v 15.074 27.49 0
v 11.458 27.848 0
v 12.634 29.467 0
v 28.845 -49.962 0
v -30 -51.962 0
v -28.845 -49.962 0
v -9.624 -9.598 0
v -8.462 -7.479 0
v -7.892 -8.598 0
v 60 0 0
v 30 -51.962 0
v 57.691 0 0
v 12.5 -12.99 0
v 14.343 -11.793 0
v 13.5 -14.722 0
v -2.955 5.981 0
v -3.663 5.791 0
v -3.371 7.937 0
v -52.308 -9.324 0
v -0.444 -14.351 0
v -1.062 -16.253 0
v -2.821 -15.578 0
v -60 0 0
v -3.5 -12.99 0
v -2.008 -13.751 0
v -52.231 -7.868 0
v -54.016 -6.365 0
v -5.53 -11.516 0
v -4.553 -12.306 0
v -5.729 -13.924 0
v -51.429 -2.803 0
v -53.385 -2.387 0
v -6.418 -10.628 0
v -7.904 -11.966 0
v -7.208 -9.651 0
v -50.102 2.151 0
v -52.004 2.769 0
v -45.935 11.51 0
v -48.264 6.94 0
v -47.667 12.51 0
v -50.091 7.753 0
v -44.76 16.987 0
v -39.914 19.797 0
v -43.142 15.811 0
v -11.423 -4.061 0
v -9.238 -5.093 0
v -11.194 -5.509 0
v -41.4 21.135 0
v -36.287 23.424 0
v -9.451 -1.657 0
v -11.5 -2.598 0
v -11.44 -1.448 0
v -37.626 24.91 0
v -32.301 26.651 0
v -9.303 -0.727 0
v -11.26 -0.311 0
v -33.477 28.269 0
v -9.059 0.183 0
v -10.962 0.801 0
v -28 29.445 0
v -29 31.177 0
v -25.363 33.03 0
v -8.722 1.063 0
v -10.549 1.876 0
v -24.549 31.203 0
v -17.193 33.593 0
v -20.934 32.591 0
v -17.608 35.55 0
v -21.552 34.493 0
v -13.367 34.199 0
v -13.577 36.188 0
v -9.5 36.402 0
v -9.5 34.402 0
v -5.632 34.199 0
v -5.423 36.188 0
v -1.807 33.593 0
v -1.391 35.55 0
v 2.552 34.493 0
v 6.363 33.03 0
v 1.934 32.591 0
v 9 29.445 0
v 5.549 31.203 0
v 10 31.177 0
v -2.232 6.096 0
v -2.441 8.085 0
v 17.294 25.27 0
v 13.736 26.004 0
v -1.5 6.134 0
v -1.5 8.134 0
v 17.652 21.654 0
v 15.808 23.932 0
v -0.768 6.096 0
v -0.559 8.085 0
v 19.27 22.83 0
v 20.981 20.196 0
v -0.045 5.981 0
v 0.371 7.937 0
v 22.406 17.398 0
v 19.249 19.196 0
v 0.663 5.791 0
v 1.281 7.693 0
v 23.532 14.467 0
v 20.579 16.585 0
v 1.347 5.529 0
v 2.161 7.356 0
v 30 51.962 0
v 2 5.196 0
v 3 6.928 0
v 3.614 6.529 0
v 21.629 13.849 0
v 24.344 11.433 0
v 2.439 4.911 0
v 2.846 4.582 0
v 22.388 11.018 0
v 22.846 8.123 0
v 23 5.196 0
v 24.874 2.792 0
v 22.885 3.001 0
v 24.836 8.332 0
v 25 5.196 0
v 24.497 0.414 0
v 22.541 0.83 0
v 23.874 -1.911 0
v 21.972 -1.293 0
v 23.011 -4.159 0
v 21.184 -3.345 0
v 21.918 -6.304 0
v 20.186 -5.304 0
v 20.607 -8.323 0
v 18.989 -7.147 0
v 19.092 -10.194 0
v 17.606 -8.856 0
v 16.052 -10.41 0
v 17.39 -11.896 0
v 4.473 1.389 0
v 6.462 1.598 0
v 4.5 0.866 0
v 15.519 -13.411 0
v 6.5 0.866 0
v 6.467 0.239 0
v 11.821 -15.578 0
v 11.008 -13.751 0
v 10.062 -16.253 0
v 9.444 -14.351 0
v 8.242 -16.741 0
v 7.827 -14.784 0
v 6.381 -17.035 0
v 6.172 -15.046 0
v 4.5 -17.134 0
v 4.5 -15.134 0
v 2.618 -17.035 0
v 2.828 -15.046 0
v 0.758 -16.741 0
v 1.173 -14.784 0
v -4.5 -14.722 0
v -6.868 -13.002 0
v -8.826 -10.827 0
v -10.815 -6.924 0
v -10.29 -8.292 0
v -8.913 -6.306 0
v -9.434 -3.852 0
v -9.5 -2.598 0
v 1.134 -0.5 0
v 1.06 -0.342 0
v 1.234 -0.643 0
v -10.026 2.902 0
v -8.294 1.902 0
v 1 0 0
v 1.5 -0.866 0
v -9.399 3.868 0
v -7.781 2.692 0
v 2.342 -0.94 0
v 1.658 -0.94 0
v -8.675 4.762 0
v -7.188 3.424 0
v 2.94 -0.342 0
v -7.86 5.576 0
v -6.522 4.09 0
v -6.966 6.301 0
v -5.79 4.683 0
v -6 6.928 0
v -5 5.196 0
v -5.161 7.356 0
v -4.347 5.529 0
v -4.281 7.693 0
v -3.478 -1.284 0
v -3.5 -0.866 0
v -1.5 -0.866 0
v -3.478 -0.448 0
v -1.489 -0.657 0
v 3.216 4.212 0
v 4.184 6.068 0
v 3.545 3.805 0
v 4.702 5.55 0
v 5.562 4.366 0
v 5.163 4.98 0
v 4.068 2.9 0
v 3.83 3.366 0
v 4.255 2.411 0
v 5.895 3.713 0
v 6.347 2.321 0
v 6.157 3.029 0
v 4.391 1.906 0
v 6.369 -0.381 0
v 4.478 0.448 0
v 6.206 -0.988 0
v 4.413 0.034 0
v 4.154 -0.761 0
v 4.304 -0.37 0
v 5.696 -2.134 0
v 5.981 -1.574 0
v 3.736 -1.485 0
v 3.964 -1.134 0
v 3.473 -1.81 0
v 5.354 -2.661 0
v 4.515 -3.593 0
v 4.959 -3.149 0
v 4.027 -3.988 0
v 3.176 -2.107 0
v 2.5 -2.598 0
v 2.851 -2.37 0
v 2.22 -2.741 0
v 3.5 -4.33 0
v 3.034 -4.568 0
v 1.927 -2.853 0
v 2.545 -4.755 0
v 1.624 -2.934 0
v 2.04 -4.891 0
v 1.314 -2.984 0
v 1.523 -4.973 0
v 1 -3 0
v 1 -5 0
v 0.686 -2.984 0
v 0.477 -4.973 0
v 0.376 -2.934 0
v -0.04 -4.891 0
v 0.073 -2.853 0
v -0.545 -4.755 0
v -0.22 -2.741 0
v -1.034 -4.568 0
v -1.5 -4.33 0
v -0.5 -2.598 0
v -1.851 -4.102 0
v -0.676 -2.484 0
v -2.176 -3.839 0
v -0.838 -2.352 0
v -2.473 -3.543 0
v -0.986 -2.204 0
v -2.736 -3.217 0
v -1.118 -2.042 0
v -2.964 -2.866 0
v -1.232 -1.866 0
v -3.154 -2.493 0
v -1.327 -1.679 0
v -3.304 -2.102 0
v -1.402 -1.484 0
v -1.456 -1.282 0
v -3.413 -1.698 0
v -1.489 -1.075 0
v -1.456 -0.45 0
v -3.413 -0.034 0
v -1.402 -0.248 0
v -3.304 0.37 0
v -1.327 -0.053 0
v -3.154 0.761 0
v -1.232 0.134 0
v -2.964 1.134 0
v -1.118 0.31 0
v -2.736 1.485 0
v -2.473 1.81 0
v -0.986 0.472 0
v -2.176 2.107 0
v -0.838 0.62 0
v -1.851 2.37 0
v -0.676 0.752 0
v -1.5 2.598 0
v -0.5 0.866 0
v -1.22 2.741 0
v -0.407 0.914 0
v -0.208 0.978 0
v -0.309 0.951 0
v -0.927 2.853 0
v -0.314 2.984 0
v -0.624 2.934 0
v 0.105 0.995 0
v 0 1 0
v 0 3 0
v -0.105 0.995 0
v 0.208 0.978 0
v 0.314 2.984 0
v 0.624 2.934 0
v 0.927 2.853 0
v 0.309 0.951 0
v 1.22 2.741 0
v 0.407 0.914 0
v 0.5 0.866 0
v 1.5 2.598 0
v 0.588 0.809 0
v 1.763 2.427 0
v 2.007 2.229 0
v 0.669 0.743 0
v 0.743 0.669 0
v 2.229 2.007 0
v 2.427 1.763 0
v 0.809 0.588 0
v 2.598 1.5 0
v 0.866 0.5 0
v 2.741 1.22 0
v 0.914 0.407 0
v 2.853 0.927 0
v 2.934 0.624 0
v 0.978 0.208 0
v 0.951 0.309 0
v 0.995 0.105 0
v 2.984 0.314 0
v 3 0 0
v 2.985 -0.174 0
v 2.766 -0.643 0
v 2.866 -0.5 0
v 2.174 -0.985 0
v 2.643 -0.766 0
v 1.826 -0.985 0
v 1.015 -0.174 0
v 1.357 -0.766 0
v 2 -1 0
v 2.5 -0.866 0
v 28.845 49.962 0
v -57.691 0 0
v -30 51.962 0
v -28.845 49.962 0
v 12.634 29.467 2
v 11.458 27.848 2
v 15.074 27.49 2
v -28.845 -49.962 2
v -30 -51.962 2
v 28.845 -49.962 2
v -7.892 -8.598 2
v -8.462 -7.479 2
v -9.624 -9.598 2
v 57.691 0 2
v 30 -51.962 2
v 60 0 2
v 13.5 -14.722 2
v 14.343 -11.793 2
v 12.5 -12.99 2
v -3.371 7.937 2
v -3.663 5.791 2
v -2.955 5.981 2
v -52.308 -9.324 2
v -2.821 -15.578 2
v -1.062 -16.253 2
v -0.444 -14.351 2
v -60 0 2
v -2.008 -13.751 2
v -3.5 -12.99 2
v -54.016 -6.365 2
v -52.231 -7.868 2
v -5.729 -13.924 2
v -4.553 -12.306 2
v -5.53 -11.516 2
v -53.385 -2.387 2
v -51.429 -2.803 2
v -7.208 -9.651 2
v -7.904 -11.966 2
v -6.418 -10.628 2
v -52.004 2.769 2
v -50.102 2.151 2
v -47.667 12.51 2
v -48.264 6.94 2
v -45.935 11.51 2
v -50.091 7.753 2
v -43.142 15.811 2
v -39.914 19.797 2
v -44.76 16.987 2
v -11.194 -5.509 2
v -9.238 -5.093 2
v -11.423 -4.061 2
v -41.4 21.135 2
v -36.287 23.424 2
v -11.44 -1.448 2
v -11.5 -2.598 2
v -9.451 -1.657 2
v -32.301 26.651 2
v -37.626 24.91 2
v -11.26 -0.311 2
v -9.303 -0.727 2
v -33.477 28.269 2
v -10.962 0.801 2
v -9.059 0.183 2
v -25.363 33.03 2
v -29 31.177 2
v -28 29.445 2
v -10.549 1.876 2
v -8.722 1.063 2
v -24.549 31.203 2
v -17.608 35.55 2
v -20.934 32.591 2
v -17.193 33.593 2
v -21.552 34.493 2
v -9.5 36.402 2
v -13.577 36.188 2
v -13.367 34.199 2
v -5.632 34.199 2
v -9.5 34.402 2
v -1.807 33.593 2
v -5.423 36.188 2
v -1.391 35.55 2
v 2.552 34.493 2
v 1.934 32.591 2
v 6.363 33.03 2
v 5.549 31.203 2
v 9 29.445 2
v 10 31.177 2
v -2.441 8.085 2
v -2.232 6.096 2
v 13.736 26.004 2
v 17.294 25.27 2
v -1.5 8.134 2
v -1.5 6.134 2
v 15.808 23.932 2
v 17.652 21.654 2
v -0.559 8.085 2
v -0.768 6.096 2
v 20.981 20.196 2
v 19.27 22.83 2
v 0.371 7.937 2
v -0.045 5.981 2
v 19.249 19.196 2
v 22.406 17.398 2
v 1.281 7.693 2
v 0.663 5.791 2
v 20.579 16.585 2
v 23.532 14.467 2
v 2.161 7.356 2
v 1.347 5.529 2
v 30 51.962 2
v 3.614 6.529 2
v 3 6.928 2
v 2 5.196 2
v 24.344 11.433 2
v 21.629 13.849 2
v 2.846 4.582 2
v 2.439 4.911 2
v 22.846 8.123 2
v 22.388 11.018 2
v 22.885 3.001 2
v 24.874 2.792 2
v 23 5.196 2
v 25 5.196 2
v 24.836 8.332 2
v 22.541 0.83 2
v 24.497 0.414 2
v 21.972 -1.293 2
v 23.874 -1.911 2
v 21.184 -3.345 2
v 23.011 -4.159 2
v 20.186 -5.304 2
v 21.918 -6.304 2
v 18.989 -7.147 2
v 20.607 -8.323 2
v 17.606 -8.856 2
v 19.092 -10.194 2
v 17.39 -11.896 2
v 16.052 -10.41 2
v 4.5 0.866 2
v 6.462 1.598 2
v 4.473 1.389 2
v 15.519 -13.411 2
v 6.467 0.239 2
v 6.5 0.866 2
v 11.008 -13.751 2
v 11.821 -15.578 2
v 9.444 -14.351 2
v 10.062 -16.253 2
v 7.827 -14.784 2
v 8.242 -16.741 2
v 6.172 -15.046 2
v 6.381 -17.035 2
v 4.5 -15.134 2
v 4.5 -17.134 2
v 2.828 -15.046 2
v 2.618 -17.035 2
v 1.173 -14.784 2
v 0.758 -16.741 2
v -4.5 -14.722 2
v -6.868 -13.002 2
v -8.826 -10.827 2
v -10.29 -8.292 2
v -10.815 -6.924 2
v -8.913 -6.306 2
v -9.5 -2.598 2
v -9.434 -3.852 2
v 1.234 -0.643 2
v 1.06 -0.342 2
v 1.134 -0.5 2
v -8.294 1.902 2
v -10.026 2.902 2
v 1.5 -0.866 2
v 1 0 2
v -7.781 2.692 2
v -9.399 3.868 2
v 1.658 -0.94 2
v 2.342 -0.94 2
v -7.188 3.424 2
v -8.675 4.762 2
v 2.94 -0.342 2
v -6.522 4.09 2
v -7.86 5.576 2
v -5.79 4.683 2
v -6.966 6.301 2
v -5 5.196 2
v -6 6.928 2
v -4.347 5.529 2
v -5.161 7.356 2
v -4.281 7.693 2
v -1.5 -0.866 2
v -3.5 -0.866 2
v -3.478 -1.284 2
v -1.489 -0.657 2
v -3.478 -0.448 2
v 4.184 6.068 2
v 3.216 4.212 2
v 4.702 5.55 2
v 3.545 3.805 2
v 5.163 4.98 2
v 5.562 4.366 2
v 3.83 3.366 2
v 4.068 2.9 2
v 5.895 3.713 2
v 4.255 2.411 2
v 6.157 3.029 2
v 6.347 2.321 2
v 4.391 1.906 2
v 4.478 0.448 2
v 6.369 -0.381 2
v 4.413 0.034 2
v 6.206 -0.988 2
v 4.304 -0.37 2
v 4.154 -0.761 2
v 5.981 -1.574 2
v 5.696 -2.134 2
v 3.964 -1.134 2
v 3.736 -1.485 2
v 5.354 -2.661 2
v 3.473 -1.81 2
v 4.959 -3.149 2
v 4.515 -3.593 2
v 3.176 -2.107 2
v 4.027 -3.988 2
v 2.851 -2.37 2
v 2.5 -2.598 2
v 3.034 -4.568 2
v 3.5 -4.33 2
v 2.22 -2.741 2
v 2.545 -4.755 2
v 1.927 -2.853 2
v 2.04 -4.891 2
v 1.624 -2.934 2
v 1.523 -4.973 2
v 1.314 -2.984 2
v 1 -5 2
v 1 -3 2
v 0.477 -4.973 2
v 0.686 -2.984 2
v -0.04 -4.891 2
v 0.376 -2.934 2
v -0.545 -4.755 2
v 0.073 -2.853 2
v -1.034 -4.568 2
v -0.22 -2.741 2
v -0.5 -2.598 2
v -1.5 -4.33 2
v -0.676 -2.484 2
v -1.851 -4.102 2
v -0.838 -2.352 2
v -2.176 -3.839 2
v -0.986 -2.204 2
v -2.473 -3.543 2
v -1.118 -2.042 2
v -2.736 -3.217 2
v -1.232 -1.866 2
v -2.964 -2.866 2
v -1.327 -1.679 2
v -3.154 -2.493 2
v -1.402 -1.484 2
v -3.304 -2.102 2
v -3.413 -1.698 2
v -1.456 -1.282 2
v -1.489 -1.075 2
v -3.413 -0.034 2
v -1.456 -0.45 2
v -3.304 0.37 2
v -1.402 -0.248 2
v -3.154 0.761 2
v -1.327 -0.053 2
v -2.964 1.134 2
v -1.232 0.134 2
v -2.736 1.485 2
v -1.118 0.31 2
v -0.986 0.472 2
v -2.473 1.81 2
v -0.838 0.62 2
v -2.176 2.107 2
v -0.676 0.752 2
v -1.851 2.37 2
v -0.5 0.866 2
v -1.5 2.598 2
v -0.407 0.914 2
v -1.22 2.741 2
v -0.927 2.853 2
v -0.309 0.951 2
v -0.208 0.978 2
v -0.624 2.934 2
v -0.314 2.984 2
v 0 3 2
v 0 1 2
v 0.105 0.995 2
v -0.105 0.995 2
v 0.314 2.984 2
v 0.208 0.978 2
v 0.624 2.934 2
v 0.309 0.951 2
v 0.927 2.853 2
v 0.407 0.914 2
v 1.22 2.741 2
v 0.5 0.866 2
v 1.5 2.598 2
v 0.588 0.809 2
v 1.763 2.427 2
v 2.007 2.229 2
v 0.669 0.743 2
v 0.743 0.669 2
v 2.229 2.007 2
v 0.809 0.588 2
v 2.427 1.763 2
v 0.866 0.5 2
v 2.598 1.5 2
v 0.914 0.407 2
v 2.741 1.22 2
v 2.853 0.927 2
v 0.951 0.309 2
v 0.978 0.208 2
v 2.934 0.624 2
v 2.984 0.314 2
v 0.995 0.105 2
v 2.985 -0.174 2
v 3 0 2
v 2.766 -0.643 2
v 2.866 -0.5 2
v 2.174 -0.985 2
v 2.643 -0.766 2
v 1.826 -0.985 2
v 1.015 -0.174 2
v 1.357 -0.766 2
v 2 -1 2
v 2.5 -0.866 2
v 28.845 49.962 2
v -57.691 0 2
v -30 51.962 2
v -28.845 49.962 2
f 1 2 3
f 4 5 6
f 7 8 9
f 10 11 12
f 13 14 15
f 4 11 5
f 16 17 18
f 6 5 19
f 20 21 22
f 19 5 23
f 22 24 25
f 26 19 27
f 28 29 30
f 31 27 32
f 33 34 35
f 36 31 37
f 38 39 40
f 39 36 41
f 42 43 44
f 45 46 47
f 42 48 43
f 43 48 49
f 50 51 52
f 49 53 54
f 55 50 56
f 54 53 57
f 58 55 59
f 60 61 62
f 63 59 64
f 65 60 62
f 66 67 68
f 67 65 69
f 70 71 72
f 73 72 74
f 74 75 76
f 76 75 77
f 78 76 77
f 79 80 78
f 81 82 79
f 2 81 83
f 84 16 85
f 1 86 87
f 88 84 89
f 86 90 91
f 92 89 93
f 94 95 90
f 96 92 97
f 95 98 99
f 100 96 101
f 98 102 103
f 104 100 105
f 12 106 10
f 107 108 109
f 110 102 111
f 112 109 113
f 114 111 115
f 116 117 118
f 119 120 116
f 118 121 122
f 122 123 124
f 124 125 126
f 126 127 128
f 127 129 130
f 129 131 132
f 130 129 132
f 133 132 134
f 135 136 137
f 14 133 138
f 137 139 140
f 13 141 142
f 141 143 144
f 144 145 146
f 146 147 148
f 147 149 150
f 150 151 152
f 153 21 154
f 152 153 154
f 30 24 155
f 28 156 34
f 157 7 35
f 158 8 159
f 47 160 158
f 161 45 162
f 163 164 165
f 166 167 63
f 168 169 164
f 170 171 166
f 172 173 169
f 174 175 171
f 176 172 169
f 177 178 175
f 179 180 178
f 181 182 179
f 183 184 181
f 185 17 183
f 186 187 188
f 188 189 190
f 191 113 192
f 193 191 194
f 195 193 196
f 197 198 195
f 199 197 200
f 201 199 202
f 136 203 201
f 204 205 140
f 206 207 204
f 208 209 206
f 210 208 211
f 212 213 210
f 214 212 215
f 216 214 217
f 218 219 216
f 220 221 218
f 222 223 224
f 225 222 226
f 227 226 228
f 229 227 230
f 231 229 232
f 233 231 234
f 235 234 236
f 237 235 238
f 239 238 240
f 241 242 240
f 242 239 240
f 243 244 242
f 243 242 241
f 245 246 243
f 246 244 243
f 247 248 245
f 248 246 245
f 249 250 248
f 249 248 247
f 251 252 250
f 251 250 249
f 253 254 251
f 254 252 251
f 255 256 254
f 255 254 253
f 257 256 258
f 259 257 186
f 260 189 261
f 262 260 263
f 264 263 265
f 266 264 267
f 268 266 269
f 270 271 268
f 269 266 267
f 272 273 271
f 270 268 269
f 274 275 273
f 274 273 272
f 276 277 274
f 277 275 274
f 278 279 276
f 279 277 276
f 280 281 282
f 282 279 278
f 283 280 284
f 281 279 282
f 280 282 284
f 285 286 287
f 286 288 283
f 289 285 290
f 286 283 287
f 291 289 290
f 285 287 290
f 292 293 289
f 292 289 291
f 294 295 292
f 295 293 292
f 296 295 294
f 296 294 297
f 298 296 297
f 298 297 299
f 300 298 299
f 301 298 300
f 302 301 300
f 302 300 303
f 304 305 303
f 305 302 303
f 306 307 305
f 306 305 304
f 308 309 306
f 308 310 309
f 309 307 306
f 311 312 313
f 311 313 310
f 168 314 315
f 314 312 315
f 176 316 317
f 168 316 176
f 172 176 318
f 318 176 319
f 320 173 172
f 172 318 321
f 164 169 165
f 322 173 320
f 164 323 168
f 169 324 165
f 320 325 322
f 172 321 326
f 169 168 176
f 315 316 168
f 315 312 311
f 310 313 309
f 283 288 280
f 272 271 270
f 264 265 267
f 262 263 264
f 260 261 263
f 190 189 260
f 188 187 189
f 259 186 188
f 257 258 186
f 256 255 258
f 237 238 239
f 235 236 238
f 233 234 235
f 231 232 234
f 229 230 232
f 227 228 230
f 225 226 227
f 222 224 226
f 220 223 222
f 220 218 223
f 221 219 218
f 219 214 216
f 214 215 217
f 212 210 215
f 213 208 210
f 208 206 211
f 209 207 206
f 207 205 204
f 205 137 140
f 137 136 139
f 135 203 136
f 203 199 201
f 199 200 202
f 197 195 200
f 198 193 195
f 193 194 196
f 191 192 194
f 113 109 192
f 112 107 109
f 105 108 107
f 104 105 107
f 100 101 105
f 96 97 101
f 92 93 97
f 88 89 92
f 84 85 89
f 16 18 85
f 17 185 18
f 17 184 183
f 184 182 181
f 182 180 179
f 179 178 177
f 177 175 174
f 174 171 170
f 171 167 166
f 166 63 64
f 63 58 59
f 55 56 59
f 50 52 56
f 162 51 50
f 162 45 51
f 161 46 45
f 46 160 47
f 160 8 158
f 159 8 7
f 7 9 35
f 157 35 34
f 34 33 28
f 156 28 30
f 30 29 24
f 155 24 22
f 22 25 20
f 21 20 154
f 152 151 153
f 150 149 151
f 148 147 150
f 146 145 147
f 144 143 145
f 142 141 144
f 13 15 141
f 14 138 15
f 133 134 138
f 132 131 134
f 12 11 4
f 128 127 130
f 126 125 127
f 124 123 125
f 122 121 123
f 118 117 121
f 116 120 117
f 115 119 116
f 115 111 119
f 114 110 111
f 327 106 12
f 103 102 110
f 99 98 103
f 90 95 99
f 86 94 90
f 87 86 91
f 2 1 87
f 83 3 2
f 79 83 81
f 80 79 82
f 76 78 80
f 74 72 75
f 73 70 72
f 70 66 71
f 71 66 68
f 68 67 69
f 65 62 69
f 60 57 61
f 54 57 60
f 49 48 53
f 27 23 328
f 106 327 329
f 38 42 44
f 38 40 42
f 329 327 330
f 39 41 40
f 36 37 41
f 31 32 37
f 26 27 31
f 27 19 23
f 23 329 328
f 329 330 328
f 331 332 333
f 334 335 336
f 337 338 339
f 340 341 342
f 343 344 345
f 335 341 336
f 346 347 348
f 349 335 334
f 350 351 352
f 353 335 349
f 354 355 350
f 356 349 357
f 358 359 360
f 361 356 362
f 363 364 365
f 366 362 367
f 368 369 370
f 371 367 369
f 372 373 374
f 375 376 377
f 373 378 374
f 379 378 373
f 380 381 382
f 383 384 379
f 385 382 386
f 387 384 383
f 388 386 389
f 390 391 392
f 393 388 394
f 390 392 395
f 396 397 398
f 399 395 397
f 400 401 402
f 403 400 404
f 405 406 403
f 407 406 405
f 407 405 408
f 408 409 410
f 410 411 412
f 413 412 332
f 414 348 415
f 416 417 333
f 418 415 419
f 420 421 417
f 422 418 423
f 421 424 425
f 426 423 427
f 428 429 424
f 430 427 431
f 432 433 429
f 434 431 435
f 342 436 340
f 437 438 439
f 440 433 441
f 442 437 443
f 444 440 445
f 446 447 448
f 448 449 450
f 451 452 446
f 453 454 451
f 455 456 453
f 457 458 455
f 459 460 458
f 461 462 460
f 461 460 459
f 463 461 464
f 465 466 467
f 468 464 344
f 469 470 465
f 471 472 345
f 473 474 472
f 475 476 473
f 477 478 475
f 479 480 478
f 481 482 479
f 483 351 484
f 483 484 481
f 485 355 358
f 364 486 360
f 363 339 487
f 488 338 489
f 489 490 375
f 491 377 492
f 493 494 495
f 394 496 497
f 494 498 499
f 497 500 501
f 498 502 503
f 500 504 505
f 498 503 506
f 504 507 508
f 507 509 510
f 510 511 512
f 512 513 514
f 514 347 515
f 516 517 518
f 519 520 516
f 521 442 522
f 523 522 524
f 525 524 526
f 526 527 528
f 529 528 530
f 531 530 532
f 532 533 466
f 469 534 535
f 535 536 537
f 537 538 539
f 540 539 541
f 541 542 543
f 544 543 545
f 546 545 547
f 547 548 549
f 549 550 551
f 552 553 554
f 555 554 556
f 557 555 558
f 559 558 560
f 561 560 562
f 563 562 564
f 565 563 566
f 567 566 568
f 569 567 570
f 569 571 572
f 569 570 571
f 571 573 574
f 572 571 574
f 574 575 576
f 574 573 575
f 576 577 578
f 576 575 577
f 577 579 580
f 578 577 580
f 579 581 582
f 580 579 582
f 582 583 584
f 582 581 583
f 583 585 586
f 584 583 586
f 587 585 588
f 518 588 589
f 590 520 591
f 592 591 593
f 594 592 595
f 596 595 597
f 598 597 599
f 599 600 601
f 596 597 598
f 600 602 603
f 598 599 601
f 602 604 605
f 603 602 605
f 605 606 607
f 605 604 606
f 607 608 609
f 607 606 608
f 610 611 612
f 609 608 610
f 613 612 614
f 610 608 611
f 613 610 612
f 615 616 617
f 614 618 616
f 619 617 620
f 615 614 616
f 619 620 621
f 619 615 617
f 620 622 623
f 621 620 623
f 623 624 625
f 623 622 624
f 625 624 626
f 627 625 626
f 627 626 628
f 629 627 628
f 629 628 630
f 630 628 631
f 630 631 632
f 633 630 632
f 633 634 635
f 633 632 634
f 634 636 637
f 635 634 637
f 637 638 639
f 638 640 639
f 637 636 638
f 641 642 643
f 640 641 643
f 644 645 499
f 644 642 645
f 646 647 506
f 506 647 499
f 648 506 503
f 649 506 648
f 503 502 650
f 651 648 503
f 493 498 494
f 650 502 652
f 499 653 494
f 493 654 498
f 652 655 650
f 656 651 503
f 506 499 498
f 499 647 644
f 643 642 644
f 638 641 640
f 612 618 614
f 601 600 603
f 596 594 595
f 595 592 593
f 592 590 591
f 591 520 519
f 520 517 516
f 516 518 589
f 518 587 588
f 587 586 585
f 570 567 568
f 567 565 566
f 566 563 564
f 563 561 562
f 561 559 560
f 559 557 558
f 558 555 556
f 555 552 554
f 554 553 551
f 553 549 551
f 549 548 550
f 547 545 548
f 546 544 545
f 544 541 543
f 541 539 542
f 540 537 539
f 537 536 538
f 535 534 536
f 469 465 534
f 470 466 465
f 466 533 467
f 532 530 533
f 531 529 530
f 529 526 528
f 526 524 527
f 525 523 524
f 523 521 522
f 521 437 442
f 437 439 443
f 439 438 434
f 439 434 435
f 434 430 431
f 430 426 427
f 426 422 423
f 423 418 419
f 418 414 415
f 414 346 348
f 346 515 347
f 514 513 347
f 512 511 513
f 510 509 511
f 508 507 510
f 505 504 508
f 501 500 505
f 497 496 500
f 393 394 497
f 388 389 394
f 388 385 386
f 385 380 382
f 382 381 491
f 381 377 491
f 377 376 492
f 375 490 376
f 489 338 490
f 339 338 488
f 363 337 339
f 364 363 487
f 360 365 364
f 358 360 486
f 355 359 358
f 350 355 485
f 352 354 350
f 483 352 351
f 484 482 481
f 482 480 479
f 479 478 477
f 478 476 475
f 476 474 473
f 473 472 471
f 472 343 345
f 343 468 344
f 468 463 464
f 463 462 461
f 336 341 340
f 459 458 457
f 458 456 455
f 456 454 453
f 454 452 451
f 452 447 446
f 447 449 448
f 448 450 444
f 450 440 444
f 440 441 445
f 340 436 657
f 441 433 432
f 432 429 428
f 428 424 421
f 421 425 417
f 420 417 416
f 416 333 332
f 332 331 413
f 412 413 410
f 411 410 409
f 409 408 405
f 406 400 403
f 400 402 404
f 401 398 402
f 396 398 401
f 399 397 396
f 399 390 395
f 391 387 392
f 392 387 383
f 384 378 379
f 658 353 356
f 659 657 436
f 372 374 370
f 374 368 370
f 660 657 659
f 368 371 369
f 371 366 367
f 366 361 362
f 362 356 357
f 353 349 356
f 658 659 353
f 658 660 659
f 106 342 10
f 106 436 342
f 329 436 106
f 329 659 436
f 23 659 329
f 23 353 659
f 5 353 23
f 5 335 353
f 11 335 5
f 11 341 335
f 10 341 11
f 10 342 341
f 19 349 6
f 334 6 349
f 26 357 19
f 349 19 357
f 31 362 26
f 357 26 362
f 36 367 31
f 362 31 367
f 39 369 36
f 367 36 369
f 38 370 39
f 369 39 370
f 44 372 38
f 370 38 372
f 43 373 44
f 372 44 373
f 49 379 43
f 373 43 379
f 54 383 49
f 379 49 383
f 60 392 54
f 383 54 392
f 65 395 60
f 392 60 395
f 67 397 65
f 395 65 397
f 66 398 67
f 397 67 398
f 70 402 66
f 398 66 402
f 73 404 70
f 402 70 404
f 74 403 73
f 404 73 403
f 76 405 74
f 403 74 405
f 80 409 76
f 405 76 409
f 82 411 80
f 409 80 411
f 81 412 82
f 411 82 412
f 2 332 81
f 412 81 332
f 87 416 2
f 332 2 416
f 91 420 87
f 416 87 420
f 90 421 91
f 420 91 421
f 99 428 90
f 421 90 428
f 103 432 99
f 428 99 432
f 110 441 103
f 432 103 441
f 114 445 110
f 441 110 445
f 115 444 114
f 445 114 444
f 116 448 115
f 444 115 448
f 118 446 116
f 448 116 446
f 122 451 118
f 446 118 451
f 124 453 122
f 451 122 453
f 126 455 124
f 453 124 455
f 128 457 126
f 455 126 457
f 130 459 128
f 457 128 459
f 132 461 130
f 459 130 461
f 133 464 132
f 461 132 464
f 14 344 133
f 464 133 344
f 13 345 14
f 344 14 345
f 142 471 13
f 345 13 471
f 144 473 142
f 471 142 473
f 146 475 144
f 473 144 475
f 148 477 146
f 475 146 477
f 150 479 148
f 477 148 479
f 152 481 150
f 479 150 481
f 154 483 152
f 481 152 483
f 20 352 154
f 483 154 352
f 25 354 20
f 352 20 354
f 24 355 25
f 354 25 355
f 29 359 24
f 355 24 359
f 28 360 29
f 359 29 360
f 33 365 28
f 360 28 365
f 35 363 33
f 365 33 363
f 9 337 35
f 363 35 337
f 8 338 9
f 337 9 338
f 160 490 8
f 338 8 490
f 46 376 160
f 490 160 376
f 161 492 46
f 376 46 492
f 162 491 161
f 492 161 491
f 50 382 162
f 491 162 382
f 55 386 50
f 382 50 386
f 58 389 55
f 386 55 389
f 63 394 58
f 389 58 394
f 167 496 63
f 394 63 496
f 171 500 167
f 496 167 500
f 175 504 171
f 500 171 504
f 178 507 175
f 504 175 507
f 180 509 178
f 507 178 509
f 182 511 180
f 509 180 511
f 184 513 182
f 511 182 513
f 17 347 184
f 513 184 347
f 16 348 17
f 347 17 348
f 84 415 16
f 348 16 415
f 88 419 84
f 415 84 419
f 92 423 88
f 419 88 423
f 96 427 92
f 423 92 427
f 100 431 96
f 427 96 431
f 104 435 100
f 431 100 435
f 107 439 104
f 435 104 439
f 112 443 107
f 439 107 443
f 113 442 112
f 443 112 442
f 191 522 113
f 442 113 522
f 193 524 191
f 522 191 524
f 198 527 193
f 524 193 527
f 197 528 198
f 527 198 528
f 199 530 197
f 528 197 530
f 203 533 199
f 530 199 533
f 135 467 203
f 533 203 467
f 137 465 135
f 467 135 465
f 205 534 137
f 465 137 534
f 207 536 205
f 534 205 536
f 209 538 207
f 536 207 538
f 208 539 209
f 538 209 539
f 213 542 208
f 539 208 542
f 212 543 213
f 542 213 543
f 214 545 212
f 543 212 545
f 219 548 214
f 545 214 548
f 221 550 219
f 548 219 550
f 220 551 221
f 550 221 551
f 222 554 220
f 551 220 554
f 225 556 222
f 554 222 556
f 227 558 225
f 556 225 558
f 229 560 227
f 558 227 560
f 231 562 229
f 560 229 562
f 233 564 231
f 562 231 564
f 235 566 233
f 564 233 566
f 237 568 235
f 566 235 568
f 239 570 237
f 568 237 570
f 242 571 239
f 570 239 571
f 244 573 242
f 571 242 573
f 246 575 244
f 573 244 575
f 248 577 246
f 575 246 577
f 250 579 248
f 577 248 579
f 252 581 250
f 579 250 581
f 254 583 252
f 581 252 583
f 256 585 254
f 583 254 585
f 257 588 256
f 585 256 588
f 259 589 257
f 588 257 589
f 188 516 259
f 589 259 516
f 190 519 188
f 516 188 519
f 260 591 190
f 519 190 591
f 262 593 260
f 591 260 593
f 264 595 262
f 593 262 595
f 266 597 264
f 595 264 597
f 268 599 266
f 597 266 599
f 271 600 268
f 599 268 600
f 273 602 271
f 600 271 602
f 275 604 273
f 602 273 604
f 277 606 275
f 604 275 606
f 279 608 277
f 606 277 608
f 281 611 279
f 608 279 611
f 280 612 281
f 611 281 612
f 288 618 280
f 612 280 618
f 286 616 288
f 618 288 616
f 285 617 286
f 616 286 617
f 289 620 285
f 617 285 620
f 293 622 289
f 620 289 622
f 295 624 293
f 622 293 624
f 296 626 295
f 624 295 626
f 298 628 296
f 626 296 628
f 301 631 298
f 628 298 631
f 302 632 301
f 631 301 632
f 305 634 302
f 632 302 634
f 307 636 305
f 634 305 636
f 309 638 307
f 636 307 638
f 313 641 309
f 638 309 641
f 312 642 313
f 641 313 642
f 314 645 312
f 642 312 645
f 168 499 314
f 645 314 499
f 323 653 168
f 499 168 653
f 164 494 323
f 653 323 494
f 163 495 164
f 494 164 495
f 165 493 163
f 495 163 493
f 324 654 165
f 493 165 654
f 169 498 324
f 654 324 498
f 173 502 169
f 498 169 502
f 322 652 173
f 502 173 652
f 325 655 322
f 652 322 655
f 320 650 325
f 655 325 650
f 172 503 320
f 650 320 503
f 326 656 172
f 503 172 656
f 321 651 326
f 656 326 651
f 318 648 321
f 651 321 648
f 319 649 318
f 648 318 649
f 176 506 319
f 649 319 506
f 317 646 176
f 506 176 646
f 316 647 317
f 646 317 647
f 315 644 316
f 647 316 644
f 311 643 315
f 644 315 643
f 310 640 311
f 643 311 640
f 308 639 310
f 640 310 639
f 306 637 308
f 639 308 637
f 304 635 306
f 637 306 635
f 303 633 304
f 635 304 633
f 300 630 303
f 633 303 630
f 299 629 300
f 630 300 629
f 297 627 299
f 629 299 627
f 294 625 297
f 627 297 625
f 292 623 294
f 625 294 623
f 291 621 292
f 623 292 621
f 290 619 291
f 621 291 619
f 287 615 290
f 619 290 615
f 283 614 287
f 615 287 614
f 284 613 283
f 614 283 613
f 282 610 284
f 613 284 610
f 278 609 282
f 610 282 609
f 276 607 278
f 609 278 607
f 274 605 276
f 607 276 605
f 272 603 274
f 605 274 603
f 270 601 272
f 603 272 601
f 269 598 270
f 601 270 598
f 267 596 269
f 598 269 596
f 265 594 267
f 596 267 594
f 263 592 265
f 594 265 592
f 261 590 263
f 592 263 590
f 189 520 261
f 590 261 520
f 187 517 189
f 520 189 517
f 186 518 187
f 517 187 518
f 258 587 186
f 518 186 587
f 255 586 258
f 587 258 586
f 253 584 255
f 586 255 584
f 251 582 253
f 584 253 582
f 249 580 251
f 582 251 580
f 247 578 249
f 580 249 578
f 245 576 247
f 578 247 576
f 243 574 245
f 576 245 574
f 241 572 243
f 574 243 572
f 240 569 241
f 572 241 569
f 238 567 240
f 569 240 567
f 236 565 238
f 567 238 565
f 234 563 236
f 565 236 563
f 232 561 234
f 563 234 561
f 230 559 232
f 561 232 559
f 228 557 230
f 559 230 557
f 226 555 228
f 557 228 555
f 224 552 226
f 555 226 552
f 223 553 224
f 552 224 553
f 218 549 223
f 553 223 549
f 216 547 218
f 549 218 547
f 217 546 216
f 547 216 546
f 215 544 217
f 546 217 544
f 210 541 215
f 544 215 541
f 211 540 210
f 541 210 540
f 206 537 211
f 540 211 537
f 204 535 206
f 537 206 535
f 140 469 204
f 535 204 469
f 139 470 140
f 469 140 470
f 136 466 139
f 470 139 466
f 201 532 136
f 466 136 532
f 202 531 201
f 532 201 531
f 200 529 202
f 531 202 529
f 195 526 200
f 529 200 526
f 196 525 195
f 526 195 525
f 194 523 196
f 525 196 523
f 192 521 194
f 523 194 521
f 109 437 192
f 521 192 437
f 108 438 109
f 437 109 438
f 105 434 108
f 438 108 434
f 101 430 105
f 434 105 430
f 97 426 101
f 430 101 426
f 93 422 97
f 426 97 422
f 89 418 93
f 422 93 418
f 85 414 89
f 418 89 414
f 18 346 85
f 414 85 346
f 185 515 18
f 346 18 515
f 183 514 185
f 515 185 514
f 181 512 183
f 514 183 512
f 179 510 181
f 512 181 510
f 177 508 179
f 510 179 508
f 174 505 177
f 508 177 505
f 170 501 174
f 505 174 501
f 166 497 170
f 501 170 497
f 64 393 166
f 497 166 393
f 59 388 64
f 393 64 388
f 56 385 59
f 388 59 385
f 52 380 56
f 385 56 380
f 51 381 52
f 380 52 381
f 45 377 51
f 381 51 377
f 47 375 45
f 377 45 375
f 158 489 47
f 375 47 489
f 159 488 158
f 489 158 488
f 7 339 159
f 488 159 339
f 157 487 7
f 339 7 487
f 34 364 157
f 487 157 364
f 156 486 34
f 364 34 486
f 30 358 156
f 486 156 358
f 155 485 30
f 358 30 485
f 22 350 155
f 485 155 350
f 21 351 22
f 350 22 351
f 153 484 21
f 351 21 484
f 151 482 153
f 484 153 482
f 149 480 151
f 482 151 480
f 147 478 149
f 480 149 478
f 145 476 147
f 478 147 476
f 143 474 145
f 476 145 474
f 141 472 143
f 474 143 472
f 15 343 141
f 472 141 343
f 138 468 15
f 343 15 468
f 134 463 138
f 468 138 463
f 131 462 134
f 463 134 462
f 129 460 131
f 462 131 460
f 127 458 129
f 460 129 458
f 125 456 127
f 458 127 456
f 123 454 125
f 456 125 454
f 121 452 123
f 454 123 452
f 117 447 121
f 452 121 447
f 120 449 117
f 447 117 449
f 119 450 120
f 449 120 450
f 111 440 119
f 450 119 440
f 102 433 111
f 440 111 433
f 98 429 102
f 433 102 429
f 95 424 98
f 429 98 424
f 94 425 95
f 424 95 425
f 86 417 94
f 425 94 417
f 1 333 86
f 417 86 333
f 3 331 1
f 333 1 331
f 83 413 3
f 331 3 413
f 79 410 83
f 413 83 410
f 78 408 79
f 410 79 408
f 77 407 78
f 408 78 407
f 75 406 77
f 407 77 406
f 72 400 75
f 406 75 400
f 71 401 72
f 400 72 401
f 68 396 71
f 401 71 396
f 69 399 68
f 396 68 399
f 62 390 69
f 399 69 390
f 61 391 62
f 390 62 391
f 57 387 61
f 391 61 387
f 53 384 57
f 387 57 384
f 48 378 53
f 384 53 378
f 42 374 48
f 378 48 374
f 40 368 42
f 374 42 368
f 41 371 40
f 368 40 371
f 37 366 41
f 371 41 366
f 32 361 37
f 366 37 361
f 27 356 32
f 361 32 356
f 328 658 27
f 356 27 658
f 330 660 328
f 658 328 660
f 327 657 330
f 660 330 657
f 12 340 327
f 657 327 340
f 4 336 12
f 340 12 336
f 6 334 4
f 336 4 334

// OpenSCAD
/* 
Adaptación do ficheiro "Golden spiral generator" https://www.thingiverse.com/thing:1759124 
para 100hex 
https://tecnoloxia.org/100hex/

Espiral de Fibonacci
https://en.wikipedia.org/wiki/Fermat%27s_spiral
f0=0
f1=1
fn=fn-1+fn-2

Espiral de padovan
https://es.wikipedia.org/wiki/Sucesi%C3%B3n_de_Padovan
P(0)=P(1)=P(2)=1
P(n)=P(n-2)+P(n-3)
*/

// Parámetros hexágono
hexagono=true;      // true/false
hex=60;             // lado do hexágono
bordo=2;            // ancho do bordo

// Parámteros espiral
tipo=1;         // 0:fibonacci, 1:padovan
escala=1;
espirais=1;     // nº de espirais
dobre=false;     // false/true - simpre ou dobre
xiro=0;         // ángulo de xiro o patrón xerado
n_inicio=1;     
n_final=15;
w = bordo/escala;   // ancho liña
h = 2;          // altura
res=36;         // resolución

// Función de fibonacci
function fibonacci(n) = 
    n == 0 || n == 1 ? n : ( fibonacci(n-1)+fibonacci(n-2) 
);
// Función de padovan
function padovan(n) = 
    n == 0 || n == 1 || n== 2 ? 1 : ( padovan(n-2)+padovan(n-3) 
);

// sectores para cada intervalo
module sector(radio, angulo, fn) {  
    r = radio/cos(180/fn);
    step = -360/fn;   
    points = concat(
        [[0, 0]], 
        [for(a = [angulo[0] : step : angulo[1]-360]) 
            [r*cos(a), r*sin(a)]
        ],
        [[r*cos(angulo[1]), r*sin(angulo[1])]]
    );
    difference() {
        circle(radio, $fn = fn);
        polygon(points);
    }
}

module arco(radio, angulo, ancho=w, fn=res) {
    difference() {
        sector(radio+ancho, angulo, fn);
        sector(radio, angulo, fn);
    }
} 

// xeración das espirais

module Fibonacci_espiral(from, to, thickness) {
    if(from <= to) {
        f1 = fibonacci(from);
        f2 = fibonacci(from+ 1);
        arco(f1, [0, 90], thickness, 60);
        offset = f2-f1;
        translate([0, -offset, 0]) rotate(90)
            Fibonacci_espiral(from + 1, to, thickness);
    }
}
module Padovan_espiral(from, to, thickness) {
    union(){
        if(from <= to) {
            f1 = padovan(from);
            f2 = padovan(from+ 1);
            arco(f1, [0, 60], thickness, 60);
            offset = f2-f1;
            translate([-offset*cos(60), -offset*sin(60), 0]) rotate(60)
                Padovan_espiral(from+1, to, thickness);
        }
    
    }
}

// construción das espirais

module pattern(){
    
        if(tipo==0){ 
        union(){
            translate([fibonacci(n_inicio)+w/2,0,0]) circle(d=w,  $fn=res);    
            for(x = [0: 360/espirais: 360-360/espirais]) {
                rotate(x) Fibonacci_espiral(n_inicio, n_final, w); 
                if (dobre==true){
                    rotate(x) mirror(90) Fibonacci_espiral(n_inicio, n_final, w); 
                } 
            }
        }
    }
    if(tipo==1){ 
        union(){
            translate([padovan(n_inicio)+w/2,0,0]) circle(d=w,  $fn=res);  
        for(x = [0: 360/espirais: 360-360/espirais]) {
            rotate(x) Padovan_espiral(n_inicio, n_final, w); 
            if (dobre==true){
                rotate(x) mirror(90) Padovan_espiral(n_inicio, n_final, w); } 
            }
        }
    }

}

// Inserir dentro dun hexágono

if (hexagono==true){
    linear_extrude(h) union() {
        difference (){
            circle(r=hex, $fn=6);
            circle(r=(hex-bordo/cos(30)), $fn=6); 
        }
        intersection(){
            circle(r=hex, $fn=6);
            scale(escala) translate([0,0,0]) rotate(xiro) pattern();
        }
    }
}
else{
    scale(escala) rotate(xiro) pattern();
}
